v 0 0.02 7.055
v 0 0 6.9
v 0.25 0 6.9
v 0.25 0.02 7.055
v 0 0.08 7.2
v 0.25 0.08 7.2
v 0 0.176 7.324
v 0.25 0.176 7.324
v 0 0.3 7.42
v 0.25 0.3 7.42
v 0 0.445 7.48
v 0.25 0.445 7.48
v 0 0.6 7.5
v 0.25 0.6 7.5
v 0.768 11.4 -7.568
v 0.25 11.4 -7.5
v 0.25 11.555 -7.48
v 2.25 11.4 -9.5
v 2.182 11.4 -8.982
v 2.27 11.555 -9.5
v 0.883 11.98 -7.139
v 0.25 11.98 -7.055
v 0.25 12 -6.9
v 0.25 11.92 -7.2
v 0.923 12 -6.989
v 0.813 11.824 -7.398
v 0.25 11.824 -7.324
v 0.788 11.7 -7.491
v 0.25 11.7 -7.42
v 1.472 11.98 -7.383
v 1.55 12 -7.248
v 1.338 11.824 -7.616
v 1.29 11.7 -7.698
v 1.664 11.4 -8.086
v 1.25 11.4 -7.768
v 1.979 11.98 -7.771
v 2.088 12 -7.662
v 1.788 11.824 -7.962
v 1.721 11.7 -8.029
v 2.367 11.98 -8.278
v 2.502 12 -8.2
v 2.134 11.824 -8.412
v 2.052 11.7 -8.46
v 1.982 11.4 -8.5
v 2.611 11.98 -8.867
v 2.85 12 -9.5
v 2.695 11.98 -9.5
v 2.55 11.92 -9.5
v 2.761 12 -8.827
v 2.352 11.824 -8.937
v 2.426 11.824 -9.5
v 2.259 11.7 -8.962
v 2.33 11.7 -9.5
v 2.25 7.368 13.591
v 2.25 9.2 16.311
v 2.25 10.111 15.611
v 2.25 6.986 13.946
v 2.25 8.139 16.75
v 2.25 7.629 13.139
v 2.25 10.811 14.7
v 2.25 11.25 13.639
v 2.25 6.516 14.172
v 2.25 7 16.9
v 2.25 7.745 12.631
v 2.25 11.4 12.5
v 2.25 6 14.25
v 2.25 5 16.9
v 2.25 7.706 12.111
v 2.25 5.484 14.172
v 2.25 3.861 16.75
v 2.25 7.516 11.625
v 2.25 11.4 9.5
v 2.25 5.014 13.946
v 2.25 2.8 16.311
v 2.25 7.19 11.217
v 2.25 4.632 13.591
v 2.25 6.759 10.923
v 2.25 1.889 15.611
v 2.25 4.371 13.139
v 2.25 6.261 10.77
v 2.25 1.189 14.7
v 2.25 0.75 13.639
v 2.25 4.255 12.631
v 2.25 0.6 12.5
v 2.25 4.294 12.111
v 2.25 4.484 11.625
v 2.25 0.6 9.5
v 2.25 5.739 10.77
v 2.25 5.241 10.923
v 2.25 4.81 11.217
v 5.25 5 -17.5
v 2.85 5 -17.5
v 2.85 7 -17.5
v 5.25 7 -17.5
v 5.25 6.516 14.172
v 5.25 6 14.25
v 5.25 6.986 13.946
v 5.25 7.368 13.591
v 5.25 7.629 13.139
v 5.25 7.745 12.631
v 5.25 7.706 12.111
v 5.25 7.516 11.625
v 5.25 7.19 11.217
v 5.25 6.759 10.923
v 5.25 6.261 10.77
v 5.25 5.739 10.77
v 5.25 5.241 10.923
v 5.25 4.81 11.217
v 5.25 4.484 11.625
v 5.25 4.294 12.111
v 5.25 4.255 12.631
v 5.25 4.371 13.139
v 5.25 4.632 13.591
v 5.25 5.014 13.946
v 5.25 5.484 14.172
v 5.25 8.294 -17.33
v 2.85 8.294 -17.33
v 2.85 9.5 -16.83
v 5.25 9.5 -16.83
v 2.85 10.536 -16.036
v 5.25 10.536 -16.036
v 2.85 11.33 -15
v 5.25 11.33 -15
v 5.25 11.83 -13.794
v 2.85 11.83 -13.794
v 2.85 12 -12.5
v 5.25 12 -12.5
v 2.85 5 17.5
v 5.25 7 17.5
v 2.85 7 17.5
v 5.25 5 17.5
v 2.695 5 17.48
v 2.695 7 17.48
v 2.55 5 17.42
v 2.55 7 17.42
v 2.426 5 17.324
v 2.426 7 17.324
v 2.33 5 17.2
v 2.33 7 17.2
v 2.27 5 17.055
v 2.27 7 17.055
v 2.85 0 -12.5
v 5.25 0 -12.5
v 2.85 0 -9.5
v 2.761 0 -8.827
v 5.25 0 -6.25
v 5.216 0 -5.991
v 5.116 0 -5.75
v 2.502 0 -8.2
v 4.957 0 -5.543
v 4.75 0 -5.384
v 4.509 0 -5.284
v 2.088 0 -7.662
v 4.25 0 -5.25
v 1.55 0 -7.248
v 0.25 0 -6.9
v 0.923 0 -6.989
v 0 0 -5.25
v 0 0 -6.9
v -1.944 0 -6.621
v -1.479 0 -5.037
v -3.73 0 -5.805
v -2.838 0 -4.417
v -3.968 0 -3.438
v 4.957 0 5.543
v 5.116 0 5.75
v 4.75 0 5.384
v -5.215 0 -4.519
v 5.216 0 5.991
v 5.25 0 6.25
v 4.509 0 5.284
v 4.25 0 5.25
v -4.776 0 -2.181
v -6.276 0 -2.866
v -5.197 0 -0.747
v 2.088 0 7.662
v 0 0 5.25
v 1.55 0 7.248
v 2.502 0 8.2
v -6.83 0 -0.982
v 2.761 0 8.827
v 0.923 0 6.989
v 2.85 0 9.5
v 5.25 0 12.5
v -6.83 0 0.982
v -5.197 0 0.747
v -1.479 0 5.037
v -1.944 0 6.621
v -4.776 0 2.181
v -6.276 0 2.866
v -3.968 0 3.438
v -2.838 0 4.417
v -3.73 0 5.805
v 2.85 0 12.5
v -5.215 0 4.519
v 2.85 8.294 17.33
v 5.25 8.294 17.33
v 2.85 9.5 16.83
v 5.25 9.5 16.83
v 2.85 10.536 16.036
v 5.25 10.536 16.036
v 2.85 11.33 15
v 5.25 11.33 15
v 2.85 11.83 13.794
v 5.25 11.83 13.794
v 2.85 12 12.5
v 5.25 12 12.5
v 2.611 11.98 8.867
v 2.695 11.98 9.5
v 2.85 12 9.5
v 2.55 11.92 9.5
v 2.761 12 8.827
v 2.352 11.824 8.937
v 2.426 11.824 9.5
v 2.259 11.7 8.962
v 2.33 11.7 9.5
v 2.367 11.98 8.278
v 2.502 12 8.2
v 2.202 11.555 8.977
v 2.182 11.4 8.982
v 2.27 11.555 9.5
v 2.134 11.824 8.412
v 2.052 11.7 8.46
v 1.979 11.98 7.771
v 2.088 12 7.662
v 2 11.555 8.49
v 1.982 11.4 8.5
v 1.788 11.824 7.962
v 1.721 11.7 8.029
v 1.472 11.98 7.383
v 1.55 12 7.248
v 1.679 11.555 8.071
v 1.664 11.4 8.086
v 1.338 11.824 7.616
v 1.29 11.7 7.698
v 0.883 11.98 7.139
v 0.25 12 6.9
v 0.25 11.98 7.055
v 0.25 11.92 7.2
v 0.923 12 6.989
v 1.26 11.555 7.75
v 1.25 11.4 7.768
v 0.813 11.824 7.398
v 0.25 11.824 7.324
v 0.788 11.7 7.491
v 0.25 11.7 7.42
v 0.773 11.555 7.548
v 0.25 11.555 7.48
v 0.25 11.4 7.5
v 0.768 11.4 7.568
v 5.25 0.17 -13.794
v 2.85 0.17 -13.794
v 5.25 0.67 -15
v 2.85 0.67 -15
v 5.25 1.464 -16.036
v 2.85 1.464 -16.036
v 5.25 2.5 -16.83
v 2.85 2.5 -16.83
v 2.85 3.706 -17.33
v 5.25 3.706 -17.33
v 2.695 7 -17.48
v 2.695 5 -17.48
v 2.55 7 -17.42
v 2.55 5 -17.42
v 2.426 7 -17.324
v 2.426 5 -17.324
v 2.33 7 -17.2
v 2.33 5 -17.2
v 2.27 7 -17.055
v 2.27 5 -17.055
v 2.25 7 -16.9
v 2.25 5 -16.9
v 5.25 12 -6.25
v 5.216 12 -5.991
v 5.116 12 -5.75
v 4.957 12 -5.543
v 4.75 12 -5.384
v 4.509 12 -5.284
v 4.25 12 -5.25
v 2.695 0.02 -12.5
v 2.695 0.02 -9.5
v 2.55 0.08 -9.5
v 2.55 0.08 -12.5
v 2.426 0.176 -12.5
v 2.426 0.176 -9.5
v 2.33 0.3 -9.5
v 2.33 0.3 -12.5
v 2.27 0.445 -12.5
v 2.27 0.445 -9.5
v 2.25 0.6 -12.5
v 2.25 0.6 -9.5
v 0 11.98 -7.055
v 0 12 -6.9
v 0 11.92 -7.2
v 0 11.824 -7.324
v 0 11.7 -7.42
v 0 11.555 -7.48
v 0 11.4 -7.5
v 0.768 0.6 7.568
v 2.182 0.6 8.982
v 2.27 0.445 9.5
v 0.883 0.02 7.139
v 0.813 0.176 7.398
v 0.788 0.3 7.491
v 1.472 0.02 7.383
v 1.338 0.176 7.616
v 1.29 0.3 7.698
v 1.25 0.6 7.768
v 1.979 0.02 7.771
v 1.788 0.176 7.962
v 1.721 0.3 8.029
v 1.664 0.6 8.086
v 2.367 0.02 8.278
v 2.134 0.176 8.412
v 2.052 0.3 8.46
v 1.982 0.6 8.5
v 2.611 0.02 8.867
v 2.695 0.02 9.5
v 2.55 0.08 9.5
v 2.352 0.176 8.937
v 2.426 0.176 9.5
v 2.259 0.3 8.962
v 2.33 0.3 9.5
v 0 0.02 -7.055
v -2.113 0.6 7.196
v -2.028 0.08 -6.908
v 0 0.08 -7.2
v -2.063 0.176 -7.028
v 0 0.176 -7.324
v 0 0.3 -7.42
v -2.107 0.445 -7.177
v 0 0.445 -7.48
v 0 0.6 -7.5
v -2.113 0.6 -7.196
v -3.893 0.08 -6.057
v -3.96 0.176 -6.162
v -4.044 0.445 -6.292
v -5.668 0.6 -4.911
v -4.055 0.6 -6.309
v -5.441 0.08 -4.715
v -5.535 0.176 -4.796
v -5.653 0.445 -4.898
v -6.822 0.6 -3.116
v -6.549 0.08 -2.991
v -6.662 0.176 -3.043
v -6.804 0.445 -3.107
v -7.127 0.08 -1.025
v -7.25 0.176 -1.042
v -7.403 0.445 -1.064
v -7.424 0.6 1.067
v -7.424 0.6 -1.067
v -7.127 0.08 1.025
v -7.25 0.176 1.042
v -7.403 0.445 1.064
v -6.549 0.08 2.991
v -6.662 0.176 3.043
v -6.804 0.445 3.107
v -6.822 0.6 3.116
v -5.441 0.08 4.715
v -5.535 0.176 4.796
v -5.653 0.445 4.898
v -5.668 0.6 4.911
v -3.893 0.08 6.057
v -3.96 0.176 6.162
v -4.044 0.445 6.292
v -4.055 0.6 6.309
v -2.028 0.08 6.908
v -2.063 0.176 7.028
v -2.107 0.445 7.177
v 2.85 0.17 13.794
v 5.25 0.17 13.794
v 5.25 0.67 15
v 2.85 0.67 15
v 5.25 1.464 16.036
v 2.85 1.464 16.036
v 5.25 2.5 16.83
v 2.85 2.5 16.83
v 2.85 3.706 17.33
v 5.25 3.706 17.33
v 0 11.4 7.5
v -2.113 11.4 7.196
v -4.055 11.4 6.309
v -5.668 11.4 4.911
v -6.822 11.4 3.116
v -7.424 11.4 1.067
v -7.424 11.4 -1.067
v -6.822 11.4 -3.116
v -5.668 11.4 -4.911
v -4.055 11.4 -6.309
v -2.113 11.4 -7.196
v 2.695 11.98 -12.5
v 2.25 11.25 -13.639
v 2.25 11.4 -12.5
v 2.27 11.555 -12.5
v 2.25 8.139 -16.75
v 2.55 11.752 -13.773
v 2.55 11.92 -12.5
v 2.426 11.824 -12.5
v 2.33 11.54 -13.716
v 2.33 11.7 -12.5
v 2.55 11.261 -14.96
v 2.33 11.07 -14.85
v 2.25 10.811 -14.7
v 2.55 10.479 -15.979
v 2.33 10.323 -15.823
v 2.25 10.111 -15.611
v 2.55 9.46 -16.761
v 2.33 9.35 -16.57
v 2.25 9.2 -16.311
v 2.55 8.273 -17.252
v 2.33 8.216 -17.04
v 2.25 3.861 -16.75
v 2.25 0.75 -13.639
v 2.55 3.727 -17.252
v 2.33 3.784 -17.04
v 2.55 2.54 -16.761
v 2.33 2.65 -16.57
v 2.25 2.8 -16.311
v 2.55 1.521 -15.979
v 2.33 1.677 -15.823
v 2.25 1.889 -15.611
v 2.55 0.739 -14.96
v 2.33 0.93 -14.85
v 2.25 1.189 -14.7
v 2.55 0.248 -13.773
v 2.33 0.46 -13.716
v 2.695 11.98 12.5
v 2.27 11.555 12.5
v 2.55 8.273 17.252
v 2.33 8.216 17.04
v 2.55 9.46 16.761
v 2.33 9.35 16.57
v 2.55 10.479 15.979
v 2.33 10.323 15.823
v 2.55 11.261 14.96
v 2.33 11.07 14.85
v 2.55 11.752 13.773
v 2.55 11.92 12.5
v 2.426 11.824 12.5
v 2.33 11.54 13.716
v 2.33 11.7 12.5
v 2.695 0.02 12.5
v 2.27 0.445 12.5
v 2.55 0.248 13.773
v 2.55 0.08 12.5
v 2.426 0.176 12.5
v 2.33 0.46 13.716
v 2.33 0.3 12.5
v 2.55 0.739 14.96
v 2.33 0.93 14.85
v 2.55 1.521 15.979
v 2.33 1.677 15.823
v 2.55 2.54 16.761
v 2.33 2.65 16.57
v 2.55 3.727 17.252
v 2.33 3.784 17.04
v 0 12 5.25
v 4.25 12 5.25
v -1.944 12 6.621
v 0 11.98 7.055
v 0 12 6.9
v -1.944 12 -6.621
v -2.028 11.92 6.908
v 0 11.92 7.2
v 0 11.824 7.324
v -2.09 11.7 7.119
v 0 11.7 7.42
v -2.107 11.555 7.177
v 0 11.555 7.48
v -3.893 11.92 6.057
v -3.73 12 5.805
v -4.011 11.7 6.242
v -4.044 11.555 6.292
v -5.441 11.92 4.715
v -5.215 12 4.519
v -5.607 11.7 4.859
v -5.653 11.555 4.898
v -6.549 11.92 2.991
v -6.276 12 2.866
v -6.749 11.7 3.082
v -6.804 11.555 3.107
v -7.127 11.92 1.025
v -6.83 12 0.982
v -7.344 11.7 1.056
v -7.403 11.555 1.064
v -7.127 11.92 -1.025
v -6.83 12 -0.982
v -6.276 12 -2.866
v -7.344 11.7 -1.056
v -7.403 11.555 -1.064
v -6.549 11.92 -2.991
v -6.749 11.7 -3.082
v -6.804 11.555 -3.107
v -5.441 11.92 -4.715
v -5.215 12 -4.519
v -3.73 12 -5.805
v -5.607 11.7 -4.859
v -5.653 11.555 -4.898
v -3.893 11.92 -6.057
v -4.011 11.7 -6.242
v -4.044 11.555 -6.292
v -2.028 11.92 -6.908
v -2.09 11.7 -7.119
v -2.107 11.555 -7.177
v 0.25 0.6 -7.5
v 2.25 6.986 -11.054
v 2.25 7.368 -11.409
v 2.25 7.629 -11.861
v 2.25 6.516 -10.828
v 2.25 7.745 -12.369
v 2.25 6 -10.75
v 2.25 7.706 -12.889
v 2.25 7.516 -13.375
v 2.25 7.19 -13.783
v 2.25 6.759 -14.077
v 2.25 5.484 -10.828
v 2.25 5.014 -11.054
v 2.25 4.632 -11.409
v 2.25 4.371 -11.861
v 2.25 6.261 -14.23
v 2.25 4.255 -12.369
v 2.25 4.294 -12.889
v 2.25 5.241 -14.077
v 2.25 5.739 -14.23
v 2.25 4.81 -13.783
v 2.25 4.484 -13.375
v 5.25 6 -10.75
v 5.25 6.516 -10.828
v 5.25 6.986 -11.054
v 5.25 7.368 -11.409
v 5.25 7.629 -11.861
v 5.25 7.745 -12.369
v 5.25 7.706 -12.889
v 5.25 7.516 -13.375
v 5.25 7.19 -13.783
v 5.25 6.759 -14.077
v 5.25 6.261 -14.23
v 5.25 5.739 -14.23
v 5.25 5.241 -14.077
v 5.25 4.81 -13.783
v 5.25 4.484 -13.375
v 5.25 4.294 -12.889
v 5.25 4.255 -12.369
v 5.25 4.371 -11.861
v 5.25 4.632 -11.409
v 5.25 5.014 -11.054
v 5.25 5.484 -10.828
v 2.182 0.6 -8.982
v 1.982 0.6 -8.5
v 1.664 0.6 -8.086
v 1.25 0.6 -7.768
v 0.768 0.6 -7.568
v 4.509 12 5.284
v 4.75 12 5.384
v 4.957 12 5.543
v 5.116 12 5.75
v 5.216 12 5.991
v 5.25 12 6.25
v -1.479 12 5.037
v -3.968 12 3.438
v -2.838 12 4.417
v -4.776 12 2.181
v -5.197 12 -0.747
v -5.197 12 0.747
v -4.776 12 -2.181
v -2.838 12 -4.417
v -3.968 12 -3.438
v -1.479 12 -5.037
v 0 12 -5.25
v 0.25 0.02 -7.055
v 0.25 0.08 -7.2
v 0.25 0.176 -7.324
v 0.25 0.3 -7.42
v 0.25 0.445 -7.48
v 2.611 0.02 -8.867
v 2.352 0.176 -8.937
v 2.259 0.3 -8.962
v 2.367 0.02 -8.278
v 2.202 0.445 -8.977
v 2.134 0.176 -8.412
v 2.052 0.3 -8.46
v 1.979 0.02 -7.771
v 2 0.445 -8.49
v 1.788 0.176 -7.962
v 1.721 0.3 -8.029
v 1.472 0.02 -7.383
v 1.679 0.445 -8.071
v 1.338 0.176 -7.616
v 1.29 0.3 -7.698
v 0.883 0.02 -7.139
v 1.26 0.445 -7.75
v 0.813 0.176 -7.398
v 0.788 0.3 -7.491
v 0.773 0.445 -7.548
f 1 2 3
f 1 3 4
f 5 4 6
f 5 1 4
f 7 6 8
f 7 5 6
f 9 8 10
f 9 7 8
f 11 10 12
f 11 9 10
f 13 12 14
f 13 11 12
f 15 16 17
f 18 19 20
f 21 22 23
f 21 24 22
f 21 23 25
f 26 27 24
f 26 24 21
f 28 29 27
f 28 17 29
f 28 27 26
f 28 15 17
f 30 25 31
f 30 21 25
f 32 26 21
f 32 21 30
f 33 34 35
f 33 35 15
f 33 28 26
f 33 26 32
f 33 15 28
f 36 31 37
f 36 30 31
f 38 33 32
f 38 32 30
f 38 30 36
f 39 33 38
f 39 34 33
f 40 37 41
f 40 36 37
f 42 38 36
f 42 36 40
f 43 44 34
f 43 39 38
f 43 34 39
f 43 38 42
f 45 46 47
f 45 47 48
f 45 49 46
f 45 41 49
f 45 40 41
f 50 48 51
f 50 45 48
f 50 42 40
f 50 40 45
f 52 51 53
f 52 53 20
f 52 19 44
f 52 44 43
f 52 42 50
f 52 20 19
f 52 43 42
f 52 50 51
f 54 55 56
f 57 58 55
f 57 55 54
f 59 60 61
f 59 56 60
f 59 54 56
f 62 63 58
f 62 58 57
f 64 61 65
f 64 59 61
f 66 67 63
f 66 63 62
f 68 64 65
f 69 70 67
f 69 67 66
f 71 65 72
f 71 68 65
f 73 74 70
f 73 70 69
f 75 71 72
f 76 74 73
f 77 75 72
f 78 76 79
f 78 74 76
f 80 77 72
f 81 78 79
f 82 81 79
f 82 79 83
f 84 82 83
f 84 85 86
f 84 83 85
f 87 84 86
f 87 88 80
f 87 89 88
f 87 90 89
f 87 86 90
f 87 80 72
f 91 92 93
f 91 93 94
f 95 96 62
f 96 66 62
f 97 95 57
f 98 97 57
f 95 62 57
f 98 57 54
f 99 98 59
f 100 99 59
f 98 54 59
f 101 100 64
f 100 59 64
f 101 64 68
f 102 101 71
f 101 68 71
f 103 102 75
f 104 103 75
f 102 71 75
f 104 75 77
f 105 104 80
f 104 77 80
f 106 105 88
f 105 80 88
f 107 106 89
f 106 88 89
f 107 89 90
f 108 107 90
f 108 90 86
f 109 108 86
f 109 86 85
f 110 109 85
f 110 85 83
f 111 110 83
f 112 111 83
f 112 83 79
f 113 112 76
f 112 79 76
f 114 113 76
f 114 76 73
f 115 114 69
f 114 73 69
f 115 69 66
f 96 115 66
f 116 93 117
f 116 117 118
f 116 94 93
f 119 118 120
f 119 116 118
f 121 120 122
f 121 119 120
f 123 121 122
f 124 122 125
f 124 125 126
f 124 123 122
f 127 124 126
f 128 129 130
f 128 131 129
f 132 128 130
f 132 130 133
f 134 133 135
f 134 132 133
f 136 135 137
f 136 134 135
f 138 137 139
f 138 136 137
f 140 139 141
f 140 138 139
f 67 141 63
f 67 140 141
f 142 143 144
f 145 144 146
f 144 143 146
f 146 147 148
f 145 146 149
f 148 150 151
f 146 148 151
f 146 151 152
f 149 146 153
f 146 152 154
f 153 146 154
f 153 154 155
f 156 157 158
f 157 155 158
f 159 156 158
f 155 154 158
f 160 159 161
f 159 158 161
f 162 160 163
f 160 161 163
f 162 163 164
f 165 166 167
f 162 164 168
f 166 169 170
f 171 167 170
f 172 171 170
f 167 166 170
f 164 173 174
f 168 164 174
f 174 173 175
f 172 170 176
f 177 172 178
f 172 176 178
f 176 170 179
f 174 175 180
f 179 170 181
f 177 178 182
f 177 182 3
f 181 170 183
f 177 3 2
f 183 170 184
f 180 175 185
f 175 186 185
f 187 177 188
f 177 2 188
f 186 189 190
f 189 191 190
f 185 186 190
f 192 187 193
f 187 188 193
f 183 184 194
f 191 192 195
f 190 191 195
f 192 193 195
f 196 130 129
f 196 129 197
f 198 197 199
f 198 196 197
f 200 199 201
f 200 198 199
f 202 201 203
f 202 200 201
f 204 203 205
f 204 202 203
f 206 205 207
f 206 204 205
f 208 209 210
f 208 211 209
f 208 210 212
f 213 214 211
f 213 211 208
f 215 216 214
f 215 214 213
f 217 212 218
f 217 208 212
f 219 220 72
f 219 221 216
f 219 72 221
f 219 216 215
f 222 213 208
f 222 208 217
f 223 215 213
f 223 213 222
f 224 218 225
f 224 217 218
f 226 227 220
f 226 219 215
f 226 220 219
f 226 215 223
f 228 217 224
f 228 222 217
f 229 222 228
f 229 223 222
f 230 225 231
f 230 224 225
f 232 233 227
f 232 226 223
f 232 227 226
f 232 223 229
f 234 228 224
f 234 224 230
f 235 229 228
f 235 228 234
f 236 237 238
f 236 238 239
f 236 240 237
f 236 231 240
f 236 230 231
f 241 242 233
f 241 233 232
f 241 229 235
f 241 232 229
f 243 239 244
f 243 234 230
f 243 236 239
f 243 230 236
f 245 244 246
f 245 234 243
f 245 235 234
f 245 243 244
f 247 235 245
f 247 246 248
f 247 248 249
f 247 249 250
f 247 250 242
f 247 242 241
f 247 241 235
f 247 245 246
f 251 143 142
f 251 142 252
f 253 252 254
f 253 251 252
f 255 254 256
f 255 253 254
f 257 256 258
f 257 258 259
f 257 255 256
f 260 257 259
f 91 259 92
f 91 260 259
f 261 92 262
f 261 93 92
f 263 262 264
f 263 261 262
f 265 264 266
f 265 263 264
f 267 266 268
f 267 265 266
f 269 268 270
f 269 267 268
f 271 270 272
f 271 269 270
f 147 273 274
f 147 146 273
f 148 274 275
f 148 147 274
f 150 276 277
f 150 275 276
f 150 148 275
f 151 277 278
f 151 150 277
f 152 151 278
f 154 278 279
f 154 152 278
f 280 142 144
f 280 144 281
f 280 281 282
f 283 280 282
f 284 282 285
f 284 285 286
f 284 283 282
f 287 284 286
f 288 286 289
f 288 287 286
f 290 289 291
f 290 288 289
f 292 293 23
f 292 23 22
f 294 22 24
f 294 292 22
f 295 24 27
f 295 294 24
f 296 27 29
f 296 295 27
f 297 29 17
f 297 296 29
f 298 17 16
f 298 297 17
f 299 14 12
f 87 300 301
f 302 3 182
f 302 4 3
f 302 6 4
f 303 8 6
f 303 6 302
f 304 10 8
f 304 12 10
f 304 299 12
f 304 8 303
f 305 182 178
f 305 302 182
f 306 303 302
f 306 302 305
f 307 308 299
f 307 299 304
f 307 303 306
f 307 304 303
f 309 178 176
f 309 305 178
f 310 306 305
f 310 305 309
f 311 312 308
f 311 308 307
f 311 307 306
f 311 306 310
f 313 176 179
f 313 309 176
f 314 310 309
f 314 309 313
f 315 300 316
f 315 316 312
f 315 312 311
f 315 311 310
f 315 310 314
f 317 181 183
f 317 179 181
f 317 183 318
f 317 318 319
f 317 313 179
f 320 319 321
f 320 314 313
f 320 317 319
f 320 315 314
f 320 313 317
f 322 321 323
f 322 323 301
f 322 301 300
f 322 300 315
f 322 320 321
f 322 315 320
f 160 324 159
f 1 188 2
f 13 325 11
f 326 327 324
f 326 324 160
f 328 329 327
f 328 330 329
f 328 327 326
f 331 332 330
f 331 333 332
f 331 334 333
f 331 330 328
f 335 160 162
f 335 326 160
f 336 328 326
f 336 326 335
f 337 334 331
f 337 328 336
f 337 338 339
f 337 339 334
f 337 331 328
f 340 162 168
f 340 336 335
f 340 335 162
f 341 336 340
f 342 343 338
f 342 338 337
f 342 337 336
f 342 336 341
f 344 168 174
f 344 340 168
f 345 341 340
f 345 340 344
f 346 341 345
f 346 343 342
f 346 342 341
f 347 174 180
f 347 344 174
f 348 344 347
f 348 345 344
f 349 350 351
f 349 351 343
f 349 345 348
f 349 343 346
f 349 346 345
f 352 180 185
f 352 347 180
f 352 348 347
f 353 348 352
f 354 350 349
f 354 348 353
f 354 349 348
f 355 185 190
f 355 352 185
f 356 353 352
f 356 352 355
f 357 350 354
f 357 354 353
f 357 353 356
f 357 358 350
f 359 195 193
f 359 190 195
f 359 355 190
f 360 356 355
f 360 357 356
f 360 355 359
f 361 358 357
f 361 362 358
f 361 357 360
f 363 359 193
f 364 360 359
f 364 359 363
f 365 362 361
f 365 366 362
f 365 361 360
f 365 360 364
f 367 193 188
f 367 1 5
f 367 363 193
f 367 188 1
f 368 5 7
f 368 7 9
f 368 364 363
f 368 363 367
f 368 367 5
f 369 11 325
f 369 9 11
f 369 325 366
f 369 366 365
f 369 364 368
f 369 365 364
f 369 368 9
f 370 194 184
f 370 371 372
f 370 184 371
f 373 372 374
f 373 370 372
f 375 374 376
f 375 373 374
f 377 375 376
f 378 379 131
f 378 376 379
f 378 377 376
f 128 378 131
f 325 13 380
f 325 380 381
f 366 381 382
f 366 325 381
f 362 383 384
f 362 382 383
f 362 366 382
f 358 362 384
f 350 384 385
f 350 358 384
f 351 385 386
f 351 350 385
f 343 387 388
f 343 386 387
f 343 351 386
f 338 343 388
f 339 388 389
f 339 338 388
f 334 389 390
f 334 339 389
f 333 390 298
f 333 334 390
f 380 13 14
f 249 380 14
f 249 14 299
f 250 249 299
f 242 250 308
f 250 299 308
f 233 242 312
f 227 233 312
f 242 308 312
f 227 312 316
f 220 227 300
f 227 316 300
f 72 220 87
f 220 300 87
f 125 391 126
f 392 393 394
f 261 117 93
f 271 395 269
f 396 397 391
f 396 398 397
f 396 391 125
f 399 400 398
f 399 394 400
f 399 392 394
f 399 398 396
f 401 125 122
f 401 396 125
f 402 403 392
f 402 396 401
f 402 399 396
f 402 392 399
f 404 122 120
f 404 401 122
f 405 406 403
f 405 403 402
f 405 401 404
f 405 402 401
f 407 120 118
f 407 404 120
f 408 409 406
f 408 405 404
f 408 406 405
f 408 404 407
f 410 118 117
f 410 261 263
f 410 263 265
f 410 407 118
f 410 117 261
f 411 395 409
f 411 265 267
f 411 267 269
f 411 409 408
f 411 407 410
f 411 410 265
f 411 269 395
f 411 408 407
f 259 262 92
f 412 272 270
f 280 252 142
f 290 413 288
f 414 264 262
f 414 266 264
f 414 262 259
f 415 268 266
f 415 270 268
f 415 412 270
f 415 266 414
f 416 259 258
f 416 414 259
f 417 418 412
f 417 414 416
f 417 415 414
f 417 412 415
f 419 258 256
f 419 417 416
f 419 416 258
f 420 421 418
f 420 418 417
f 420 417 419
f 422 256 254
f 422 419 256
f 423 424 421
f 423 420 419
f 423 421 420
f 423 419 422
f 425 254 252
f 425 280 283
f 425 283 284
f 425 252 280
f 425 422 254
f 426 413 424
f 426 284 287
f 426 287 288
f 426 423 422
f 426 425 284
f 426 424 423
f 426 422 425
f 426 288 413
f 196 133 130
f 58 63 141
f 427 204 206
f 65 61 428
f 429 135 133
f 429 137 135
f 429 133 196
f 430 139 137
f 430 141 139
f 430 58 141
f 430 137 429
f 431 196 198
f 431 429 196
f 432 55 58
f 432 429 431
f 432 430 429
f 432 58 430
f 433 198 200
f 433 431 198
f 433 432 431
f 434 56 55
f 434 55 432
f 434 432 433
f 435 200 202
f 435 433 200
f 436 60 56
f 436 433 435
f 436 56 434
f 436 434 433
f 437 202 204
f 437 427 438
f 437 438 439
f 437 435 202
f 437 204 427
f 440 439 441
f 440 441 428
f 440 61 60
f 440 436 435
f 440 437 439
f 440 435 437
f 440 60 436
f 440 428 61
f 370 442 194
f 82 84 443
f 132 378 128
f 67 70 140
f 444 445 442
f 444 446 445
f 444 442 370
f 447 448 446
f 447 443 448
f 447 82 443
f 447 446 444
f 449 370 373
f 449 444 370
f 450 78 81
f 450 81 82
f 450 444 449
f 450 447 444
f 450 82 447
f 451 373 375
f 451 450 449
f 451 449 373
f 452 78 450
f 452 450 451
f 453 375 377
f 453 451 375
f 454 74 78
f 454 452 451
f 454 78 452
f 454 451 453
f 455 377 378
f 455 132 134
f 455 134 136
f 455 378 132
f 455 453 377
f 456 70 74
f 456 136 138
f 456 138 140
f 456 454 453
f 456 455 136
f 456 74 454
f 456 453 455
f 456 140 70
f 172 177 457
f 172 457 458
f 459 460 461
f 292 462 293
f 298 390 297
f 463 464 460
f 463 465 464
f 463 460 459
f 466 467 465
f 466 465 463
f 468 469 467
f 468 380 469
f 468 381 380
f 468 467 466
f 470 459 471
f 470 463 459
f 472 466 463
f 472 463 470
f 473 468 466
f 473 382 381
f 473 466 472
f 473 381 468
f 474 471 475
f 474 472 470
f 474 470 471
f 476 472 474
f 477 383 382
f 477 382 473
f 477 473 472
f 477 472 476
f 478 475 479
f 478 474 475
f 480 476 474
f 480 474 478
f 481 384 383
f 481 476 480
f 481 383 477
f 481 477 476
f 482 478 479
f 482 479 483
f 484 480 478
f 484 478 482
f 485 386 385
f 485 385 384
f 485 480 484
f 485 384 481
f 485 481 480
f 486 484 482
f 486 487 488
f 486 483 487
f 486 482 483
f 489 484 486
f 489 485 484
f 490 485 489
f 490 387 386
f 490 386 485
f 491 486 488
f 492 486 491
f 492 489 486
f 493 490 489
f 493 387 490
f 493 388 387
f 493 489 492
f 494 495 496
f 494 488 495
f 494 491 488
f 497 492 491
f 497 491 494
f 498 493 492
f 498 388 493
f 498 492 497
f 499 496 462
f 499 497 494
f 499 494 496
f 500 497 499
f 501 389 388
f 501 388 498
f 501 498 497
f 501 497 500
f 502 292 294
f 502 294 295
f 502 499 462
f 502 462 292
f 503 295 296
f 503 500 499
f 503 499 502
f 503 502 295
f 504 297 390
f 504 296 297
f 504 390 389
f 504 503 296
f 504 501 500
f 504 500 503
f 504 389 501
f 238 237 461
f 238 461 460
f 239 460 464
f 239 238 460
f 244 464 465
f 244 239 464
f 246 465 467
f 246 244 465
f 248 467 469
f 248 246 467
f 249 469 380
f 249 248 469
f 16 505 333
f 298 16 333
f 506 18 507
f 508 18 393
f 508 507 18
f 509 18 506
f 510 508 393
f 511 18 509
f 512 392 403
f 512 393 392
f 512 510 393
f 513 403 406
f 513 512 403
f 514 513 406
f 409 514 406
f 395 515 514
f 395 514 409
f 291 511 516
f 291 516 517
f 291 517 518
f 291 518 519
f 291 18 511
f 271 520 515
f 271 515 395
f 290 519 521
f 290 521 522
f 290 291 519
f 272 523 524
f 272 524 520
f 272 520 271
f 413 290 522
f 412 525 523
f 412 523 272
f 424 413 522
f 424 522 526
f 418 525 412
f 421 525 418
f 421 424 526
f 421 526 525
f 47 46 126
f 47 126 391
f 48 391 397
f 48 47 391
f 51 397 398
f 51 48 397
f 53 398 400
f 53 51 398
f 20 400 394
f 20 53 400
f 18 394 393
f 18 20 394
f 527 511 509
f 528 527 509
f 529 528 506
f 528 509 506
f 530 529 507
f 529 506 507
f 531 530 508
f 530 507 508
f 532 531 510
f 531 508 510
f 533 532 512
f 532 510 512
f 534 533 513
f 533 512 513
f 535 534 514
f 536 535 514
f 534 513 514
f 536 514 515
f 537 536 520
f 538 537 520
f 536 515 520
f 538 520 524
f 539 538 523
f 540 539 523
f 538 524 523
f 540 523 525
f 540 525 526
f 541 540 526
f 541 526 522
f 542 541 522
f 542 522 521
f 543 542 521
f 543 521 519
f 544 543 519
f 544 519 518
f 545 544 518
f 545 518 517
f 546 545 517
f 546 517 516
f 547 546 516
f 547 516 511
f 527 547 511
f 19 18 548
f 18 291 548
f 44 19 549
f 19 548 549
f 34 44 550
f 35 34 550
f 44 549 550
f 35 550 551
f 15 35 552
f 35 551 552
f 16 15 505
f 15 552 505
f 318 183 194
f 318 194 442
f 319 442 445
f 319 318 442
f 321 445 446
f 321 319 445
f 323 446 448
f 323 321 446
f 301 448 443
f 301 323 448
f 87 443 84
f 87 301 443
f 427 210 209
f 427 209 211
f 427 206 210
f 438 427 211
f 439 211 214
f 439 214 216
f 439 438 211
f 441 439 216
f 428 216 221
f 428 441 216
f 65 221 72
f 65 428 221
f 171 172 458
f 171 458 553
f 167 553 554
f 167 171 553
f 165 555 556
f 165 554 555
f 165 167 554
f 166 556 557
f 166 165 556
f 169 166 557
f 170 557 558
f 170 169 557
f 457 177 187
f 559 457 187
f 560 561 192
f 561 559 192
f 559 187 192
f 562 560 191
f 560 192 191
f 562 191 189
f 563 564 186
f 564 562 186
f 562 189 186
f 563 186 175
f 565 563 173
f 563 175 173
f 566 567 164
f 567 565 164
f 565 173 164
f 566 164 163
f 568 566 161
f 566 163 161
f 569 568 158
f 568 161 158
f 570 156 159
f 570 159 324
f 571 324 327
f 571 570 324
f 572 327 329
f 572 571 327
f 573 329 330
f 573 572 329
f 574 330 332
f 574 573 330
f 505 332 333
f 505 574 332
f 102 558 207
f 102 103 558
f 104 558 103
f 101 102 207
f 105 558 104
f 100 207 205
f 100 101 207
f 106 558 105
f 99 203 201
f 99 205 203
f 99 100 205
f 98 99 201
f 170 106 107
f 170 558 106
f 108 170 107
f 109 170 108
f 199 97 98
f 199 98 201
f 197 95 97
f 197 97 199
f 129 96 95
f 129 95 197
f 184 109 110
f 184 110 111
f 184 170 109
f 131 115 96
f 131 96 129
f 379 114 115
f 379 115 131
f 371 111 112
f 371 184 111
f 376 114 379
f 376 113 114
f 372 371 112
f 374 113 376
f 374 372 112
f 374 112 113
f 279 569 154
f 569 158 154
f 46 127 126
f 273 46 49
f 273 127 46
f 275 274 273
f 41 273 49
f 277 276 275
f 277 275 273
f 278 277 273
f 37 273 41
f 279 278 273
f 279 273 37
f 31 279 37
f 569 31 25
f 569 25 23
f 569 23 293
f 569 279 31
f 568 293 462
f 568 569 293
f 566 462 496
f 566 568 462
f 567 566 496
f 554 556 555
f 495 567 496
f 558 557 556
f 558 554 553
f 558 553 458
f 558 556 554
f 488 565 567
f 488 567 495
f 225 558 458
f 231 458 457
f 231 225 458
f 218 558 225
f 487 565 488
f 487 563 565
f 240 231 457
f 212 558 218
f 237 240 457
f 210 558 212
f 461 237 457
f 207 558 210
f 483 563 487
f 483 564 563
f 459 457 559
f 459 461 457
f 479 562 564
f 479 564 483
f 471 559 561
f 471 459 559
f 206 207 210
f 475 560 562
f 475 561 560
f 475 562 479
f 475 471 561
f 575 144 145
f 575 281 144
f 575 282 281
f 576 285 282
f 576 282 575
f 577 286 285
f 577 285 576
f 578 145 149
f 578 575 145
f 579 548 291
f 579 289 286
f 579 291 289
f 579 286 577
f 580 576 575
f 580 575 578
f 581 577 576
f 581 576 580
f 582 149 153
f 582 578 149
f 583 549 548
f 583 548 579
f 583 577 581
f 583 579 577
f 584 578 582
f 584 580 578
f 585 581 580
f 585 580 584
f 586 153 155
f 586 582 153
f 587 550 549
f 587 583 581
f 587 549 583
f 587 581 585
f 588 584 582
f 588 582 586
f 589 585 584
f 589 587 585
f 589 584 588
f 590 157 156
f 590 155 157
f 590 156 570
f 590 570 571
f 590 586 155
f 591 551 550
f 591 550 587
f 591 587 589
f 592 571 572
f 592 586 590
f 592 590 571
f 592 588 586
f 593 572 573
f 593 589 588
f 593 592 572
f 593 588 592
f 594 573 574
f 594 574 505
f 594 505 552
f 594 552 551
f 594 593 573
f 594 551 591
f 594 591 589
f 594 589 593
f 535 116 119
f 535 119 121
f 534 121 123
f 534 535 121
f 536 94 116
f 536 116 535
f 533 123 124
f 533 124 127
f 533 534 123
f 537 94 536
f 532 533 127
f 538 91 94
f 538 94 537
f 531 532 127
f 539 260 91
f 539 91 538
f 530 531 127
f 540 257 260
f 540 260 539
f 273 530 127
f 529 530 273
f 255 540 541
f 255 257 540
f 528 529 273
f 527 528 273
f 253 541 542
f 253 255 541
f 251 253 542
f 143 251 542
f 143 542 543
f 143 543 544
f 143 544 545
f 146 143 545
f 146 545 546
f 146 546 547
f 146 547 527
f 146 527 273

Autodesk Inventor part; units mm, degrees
ref_plane "YZ Plane" through (0, 0, 0) normal (1, 0, 0) x (0, 1, 0)
ref_plane "XZ Plane" through (0, 0, 0) normal (0, 1, 0) x (-1, 0, 0)
ref_plane "XY Plane" through (0, 0, 0) normal (0, 0, 1) x (1, 0, 0)
sketch "Эскиз1" plane through (0, 0, 0) normal (0, 1, 0) x (-1, 0, 0)
  arc A0 (0, -5.25) -> (0, 5.25) centre (0, 0) ccw
  arc A1 (0, -7.5) -> (0, 7.5) centre (0, 0) ccw
  line L0 (0, 7.5) -> (-0.25, 7.5)
  line L1 (-5.25, 6.25) -> (-5.25, 17.5)
  line L2 (-5.25, -17.5) -> (-5.25, -6.25)
  line L3 (-0.25, -7.5) -> (0, -7.5)
  line L4 (-5.25, 17.5) -> (-2.25, 17.5)
  line L5 (-2.25, 17.5) -> (-2.25, 9.5)
  line L6 (-2.25, -9.5) -> (-2.25, -17.5)
  line L7 (-2.25, -17.5) -> (-5.25, -17.5)
  line L8 (0, 5.25) -> (-4.25, 5.25)
  line L9 (0, -5.25) -> (-4.25, -5.25)
  arc A2 (-2.25, 9.5) -> (-0.25, 7.5) centre (-0.25, 9.5) ccw
  arc A3 (-0.25, -7.5) -> (-2.25, -9.5) centre (-0.25, -9.5) ccw
  arc A4 (-5.25, 6.25) -> (-4.25, 5.25) centre (-4.25, 6.25) ccw
  arc A5 (-4.25, -5.25) -> (-5.25, -6.25) centre (-4.25, -6.25) ccw
  point P0 (-2.25, -7.5)
  dimension "d0" = 10.5
  dimension "d4" = 3
  dimension "d5" = 2
  dimension "d6" = 1
extrude "Выдавливание1" add sketch "Эскиз1" along normal blind 12
fillet "Сопряжение1" radius 5 4 edges at (3.75, 12, 17.5) (3.75, 0, 17.5) (3.75, 12, -17.5) (3.75, 0, -17.5)
sketch "Эскиз2" plane through (2.25, 0, 9.5) normal (-1, 0, 0) x (0, 0, 1)
  line L0 (8, 5) -> (8, 7) projected
  line L1 (8, 6) -> (3, 6)
  circle A0 centre (3, 6) radius 1.75
  line L2 (-27, 5) -> (-27, 7) projected
  line L3 (-27, 6) -> (-22, 6)
  circle A1 centre (-22, 6) radius 1.75
  point P0 (-9.5, 0)
  dimension "d10" = 5
  dimension "d11" = 3.5
  dimension "d12" = 5
  dimension "d13" = 3.5
extrude "Выдавливание2" cut sketch "Эскиз2" against normal through all
fillet "Сопряжение2" radius 0.6 20 edges at (0.125, 12, 7.5) (1.6642, 12, 8.0858) (2.25, 12, 11) (2.25, 10.5355, 16.0355) (2.25, 6, 17.5) (2.25, 1.4645, 16.0355) (2.25, 0, 11) (1.6642, 0, 8.0858) (0.125, 0, 7.5) (-7.5, 0, 0) (0.125, 0, -7.5) (1.6642, 0, -8.0858) (2.25, 0, -11) (2.25, 1.4645, -16.0355) (2.25, 6, -17.5) (2.25, 10.5355, -16.0355) (2.25, 12, -11) (1.6642, 12, -8.0858) (0.125, 12, -7.5) (-7.5, 12, 0)
properties part number "tube_holder"
